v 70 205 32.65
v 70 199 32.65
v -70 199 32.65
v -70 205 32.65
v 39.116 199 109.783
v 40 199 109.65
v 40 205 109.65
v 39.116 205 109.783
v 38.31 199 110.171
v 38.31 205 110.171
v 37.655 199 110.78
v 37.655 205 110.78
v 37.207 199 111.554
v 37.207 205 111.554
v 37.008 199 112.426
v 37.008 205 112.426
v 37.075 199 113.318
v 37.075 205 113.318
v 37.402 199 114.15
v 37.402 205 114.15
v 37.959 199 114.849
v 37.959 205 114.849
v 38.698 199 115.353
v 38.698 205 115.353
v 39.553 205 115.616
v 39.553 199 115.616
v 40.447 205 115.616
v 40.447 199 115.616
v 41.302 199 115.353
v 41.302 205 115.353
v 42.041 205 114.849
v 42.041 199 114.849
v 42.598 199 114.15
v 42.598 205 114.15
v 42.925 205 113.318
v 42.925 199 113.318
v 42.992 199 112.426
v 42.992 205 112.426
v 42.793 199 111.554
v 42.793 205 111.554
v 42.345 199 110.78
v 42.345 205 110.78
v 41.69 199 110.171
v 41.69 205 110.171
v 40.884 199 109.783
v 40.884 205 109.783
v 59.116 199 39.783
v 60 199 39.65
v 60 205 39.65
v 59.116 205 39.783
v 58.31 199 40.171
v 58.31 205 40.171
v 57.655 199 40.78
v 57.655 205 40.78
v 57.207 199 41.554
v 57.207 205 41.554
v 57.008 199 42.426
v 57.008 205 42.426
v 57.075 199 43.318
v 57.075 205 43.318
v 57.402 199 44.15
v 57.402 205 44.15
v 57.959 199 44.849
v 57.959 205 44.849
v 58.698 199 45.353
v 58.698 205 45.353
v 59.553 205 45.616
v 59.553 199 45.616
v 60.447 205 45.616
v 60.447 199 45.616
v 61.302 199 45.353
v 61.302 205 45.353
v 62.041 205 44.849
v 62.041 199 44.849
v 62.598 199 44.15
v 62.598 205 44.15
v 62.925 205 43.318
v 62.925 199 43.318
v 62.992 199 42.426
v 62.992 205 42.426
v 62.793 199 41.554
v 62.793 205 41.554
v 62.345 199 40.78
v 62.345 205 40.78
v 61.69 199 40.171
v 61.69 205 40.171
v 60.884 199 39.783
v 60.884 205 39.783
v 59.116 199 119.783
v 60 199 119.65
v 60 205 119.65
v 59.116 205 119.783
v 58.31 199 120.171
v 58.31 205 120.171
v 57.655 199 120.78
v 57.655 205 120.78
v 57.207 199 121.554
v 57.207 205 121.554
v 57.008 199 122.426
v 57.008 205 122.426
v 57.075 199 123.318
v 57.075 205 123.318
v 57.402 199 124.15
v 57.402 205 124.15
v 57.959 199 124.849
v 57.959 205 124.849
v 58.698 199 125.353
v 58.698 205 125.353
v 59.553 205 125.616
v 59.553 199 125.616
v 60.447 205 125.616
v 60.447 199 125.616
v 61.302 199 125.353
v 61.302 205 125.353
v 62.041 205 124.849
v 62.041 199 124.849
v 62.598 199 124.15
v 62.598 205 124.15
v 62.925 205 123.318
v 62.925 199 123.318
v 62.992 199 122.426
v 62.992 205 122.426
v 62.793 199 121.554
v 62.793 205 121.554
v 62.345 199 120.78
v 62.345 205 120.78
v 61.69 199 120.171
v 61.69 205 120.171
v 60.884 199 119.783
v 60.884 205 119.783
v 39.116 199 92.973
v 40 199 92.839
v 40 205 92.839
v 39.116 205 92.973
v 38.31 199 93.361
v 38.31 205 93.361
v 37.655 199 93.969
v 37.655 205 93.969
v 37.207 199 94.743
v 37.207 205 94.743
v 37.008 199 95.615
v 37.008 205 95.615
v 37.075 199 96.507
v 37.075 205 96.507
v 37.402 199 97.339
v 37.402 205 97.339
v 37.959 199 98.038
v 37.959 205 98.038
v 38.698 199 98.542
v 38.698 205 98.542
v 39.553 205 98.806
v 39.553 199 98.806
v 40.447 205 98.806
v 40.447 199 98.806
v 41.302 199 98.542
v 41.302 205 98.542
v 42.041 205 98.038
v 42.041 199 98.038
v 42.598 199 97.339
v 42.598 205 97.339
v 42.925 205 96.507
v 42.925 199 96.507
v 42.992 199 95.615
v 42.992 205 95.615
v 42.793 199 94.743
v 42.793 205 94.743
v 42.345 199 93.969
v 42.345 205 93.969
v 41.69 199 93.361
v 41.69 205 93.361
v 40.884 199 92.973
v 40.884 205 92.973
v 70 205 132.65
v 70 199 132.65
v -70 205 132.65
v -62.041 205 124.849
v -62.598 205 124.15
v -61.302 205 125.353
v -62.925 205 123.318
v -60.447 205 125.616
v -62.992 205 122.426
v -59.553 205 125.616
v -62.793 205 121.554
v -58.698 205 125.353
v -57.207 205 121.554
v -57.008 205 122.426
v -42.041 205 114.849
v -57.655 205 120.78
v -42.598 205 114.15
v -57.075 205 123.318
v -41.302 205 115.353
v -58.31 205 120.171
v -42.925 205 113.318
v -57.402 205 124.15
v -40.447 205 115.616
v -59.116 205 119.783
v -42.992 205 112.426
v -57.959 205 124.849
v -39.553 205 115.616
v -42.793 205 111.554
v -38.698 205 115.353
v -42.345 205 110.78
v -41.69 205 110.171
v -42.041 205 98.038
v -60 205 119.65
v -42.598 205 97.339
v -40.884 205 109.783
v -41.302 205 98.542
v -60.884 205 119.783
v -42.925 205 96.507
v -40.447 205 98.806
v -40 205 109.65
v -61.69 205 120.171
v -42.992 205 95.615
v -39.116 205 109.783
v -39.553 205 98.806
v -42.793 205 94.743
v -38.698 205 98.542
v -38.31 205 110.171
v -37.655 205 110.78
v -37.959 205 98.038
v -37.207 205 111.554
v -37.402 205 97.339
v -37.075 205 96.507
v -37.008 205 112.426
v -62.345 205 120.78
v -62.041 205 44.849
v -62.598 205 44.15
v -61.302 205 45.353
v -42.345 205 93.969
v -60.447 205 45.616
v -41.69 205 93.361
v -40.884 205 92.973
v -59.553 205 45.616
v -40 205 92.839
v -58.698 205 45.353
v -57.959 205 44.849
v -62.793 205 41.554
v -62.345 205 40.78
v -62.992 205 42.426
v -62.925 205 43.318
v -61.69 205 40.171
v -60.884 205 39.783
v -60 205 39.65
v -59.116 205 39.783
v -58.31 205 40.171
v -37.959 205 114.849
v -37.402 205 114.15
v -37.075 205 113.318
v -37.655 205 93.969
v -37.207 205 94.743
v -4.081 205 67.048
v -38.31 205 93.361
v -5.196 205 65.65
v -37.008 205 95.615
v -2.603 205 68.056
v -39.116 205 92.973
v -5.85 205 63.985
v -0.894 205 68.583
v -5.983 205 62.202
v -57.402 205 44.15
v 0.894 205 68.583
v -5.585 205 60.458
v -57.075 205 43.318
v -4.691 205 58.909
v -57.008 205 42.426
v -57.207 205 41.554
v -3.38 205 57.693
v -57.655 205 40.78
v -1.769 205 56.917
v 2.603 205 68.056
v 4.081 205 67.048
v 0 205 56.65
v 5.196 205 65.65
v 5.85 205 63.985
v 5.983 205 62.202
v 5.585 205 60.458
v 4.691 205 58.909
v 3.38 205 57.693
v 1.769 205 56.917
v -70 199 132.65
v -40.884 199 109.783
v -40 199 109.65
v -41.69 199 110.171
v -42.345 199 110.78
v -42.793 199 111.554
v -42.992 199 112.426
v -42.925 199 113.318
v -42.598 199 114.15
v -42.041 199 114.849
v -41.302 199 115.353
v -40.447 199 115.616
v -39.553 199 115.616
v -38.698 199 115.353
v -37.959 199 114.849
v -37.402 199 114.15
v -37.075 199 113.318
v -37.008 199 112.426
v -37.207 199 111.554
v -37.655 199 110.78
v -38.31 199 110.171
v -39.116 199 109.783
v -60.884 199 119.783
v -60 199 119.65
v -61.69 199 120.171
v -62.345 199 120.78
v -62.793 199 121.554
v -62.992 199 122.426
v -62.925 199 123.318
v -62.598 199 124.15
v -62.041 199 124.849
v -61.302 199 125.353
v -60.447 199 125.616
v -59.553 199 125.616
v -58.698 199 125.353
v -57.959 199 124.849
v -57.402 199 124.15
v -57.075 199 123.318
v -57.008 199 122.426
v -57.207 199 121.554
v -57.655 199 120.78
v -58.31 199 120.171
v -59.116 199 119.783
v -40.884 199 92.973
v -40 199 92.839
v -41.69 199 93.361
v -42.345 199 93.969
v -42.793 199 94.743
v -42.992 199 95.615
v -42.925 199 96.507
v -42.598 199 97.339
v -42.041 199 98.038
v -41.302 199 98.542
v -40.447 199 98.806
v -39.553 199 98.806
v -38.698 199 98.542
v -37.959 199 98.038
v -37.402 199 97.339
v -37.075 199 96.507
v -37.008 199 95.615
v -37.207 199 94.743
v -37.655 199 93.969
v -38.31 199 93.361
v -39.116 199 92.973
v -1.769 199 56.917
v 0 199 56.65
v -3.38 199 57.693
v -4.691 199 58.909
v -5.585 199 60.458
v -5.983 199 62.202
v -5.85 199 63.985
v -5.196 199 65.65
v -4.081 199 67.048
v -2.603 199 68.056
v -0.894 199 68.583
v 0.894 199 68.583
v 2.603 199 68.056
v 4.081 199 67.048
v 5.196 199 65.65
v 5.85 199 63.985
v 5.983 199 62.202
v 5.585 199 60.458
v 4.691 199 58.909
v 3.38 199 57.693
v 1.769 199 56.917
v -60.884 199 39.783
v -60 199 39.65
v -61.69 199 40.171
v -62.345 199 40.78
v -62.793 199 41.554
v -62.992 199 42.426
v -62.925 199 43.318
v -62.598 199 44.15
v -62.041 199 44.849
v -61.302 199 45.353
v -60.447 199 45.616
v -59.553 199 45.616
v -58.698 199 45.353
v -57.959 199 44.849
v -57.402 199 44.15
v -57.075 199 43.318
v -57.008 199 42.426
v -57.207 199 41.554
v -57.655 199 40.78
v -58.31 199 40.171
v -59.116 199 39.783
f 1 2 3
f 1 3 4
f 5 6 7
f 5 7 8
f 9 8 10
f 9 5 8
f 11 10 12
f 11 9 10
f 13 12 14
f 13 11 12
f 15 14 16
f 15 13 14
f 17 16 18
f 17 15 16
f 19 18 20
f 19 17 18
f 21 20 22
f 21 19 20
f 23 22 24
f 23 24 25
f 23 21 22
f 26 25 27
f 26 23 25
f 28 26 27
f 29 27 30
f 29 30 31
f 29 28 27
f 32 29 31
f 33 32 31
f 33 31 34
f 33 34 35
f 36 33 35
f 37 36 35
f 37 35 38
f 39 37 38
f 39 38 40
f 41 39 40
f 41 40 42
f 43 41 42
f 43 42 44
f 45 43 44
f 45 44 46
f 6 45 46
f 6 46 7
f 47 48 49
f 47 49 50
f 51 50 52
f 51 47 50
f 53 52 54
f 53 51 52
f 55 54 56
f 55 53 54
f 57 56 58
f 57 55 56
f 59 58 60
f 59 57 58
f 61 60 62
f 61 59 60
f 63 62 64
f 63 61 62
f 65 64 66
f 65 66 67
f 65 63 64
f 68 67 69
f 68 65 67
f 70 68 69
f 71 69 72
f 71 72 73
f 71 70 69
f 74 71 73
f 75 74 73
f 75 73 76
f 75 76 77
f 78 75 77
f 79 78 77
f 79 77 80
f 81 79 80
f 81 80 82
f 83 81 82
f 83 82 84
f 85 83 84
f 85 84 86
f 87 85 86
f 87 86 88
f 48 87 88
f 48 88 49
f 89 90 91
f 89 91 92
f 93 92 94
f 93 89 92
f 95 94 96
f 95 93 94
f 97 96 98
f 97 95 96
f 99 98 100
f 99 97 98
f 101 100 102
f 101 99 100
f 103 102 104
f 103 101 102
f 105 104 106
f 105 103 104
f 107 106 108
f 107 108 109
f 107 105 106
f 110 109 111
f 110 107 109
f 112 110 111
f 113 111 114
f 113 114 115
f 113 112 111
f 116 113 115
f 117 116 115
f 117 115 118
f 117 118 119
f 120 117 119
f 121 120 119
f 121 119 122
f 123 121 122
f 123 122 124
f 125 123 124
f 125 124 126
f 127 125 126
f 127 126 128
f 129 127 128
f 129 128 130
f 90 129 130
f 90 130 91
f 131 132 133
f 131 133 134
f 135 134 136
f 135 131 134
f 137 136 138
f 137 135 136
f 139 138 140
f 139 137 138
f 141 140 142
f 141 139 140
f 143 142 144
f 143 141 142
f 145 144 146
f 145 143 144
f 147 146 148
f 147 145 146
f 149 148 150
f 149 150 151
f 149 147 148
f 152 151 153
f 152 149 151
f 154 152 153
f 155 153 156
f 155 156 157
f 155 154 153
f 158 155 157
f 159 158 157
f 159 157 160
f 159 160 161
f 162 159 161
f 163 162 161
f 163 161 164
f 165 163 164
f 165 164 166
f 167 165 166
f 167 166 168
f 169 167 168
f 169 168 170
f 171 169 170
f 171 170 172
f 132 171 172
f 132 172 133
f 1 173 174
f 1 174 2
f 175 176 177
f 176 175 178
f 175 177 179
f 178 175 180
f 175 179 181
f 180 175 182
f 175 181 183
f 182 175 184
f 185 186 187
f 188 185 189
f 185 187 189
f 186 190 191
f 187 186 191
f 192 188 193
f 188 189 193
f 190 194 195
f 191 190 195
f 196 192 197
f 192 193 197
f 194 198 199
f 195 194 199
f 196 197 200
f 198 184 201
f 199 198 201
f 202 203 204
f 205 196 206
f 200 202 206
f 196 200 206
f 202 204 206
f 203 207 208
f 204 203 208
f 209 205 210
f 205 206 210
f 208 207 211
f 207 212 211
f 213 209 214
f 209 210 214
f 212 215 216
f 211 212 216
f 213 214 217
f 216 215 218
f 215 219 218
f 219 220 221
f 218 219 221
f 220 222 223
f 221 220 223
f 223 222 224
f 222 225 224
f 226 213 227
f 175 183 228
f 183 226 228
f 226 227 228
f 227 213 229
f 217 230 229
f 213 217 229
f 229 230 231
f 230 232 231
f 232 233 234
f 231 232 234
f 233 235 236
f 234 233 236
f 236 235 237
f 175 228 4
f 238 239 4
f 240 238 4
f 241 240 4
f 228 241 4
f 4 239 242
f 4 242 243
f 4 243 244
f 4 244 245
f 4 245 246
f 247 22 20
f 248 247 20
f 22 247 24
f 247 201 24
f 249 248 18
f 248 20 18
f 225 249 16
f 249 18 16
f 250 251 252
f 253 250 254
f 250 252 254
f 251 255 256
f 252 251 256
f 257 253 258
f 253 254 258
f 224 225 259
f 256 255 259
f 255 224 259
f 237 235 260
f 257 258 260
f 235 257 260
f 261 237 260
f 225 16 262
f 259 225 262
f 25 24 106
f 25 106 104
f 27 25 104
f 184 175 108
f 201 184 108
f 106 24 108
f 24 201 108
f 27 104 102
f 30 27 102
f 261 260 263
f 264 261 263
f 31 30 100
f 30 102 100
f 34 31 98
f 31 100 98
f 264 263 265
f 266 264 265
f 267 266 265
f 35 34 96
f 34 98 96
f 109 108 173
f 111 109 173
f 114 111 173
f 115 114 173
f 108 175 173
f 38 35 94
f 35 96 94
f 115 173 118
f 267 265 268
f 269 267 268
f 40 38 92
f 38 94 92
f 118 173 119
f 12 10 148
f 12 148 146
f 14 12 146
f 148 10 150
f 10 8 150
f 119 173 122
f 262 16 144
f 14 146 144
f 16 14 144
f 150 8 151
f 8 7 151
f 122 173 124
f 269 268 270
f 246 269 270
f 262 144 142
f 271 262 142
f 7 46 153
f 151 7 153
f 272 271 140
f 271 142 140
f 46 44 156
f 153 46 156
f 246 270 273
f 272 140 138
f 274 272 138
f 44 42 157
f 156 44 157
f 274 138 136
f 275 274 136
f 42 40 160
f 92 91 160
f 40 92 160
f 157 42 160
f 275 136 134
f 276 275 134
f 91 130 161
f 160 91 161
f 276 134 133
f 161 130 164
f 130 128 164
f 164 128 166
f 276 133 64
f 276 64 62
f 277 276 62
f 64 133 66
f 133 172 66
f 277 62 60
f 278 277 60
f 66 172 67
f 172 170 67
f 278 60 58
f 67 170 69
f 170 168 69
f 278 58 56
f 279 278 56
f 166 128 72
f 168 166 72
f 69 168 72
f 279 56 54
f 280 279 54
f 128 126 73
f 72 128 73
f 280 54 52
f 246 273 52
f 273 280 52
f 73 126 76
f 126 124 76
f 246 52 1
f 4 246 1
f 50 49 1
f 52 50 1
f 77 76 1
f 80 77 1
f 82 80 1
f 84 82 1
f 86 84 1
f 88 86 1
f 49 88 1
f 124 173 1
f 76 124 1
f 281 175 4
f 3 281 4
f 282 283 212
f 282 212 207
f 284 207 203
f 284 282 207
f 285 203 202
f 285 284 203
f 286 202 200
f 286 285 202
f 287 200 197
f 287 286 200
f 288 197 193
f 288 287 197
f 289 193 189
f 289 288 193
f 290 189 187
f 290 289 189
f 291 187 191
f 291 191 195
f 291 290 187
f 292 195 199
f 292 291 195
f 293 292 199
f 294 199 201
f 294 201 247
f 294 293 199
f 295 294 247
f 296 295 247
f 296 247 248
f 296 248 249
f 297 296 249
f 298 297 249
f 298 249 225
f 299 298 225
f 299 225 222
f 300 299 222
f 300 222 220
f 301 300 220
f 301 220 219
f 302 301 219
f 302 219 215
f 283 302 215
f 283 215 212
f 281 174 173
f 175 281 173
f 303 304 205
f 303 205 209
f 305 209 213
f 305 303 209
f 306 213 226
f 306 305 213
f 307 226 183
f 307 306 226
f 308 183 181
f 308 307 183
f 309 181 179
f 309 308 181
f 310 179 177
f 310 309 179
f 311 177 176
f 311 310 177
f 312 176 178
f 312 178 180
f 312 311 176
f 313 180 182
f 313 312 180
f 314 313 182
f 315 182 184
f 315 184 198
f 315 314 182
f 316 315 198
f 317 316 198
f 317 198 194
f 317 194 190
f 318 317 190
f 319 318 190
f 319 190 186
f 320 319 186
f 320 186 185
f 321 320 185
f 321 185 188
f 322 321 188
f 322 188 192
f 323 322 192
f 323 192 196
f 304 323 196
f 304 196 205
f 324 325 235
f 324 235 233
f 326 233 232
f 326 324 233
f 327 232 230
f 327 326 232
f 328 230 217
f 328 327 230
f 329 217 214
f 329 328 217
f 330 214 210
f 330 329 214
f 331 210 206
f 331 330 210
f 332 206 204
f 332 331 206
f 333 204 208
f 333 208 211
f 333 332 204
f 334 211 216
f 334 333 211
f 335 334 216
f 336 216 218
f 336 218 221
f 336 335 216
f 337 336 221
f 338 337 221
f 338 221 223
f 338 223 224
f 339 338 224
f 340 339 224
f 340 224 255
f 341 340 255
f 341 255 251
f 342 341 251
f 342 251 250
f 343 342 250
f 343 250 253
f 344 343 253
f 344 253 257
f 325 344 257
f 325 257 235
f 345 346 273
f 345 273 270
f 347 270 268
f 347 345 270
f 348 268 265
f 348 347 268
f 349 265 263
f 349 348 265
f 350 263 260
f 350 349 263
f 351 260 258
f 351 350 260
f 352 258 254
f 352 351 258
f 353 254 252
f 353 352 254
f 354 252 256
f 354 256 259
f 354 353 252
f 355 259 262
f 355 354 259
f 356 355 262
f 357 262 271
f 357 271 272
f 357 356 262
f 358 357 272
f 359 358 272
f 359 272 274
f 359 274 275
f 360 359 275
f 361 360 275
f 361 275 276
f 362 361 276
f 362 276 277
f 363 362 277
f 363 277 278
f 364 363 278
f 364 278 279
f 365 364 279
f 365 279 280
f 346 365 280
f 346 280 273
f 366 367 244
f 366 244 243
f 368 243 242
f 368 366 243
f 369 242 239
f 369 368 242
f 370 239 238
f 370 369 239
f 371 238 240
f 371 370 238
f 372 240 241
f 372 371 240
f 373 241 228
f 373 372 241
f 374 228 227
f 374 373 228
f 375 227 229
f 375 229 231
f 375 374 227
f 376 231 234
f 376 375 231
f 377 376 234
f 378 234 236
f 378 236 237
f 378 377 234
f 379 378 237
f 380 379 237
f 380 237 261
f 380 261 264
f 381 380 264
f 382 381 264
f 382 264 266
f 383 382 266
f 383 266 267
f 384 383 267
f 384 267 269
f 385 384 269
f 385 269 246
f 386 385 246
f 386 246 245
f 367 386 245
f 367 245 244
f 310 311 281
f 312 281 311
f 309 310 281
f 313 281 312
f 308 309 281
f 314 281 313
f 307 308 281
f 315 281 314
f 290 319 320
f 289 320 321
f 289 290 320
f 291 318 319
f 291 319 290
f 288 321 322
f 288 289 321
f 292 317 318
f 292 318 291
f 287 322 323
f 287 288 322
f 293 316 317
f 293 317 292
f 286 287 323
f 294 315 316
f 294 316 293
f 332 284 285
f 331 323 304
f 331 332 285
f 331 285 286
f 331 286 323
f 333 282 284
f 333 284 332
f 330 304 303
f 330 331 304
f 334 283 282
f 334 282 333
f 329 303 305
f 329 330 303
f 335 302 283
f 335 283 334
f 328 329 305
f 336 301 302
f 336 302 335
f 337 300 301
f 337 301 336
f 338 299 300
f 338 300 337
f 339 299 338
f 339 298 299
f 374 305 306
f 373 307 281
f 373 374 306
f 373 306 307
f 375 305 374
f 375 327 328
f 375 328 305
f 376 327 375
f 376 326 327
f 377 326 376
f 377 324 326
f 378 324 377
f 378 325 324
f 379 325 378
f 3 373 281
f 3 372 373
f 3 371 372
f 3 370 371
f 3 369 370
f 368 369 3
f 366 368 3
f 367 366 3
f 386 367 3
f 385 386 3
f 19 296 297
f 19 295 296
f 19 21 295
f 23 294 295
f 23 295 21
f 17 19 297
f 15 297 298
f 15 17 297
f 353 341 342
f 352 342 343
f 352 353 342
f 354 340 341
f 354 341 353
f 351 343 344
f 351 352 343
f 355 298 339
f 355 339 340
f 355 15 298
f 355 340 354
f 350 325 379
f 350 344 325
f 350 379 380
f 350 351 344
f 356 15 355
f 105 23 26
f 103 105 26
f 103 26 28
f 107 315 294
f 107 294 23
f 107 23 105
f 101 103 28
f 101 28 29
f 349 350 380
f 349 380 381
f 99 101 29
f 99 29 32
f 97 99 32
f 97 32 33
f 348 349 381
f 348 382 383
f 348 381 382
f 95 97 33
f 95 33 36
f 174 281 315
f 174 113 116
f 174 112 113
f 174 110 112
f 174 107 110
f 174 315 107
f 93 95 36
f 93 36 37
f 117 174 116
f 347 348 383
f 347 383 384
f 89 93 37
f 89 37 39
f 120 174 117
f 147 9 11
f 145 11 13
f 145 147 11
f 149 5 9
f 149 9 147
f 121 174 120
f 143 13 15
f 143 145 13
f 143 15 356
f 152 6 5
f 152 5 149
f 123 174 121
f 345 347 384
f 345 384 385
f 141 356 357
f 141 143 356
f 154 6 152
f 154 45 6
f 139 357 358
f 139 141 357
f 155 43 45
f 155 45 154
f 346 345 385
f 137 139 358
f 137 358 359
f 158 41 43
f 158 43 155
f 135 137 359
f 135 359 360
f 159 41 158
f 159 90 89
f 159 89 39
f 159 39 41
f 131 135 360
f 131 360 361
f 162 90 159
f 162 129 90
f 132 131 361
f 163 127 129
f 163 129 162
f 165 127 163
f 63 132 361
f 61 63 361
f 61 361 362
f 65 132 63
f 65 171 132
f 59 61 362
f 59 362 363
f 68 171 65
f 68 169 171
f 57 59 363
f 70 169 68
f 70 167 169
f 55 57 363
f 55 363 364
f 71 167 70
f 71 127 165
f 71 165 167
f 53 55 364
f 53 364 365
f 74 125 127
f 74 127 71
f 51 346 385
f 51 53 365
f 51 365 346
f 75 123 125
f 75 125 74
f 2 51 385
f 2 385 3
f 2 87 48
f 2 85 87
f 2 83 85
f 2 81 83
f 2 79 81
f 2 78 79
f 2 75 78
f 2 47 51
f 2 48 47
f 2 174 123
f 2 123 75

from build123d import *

# Parameters (mm, degrees)
SKIZZE3_W                            = 100
SKIZZE3_H                            = 6
AUFSATZ_LINEAR_AUSTRAGEN2_DEPTH      = 70
AUFSATZ_LINEAR_AUSTRAGEN2_DEPTH_BACK = 70
HOLES_R                              = 6
HOLES_R_2                            = 3
SCHNITT_LINEAR_AUSTRAGEN2_DEPTH      = 205
SKIZZE6_R                            = 3
SCHNITT_LINEAR_AUSTRAGEN3_DEPTH      = 205


with BuildPart() as part:
    # Skizze3 → Aufsatz-Linear austragen2 (new, two sides)
    with BuildSketch(Plane(origin=(0, 0, 0), x_dir=(0, 0, -1), z_dir=(1, 0, 0))) as aufsatz_linear_austragen2_sk:
        with Locations((-82.65, 202)):
            Rectangle(SKIZZE3_W, SKIZZE3_H)
    extrude(amount=AUFSATZ_LINEAR_AUSTRAGEN2_DEPTH)
    extrude(aufsatz_linear_austragen2_sk.sketch, amount=-AUFSATZ_LINEAR_AUSTRAGEN2_DEPTH_BACK)

    # Holes → Schnitt-Linear austragen2 (cut)
    with BuildSketch(Plane(origin=(0, 0, 0), x_dir=(1, 0, 0), z_dir=(0, 1, 0))):
        with Locations(Location((0, -62.65, 0), (0, 0, 90))):
            Circle(HOLES_R)
        with Locations(Location((-40, -112.65, 0), (0, 0, 90))):
            Circle(HOLES_R_2)
        with Locations(Location((-40, -95.839319437, 0), (0, 0, 90))):
            Circle(HOLES_R_2)
        with Locations(Location((40, -95.839319437, 0), (0, 0, 90))):
            Circle(HOLES_R_2)
        with Locations(Location((40, -112.65, 0), (0, 0, 90))):
            Circle(HOLES_R_2)
    extrude(amount=SCHNITT_LINEAR_AUSTRAGEN2_DEPTH, mode=Mode.SUBTRACT)

    # Skizze6 → Schnitt-Linear austragen3 (cut)
    with BuildSketch(Plane(origin=(0, 0, 0), x_dir=(1, 0, 0), z_dir=(0, 1, 0))):
        with Locations(Location((-60, -42.65, 0), (0, 0, 90))):
            Circle(SKIZZE6_R)
        with Locations(Location((60, -42.65, 0), (0, 0, 90))):
            Circle(SKIZZE6_R)
        with Locations(Location((60, -122.65, 0), (0, 0, 90))):
            Circle(SKIZZE6_R)
        with Locations(Location((-60, -122.65, 0), (0, 0, 90))):
            Circle(SKIZZE6_R)
    extrude(amount=SCHNITT_LINEAR_AUSTRAGEN3_DEPTH, mode=Mode.SUBTRACT)


solid = part.part
